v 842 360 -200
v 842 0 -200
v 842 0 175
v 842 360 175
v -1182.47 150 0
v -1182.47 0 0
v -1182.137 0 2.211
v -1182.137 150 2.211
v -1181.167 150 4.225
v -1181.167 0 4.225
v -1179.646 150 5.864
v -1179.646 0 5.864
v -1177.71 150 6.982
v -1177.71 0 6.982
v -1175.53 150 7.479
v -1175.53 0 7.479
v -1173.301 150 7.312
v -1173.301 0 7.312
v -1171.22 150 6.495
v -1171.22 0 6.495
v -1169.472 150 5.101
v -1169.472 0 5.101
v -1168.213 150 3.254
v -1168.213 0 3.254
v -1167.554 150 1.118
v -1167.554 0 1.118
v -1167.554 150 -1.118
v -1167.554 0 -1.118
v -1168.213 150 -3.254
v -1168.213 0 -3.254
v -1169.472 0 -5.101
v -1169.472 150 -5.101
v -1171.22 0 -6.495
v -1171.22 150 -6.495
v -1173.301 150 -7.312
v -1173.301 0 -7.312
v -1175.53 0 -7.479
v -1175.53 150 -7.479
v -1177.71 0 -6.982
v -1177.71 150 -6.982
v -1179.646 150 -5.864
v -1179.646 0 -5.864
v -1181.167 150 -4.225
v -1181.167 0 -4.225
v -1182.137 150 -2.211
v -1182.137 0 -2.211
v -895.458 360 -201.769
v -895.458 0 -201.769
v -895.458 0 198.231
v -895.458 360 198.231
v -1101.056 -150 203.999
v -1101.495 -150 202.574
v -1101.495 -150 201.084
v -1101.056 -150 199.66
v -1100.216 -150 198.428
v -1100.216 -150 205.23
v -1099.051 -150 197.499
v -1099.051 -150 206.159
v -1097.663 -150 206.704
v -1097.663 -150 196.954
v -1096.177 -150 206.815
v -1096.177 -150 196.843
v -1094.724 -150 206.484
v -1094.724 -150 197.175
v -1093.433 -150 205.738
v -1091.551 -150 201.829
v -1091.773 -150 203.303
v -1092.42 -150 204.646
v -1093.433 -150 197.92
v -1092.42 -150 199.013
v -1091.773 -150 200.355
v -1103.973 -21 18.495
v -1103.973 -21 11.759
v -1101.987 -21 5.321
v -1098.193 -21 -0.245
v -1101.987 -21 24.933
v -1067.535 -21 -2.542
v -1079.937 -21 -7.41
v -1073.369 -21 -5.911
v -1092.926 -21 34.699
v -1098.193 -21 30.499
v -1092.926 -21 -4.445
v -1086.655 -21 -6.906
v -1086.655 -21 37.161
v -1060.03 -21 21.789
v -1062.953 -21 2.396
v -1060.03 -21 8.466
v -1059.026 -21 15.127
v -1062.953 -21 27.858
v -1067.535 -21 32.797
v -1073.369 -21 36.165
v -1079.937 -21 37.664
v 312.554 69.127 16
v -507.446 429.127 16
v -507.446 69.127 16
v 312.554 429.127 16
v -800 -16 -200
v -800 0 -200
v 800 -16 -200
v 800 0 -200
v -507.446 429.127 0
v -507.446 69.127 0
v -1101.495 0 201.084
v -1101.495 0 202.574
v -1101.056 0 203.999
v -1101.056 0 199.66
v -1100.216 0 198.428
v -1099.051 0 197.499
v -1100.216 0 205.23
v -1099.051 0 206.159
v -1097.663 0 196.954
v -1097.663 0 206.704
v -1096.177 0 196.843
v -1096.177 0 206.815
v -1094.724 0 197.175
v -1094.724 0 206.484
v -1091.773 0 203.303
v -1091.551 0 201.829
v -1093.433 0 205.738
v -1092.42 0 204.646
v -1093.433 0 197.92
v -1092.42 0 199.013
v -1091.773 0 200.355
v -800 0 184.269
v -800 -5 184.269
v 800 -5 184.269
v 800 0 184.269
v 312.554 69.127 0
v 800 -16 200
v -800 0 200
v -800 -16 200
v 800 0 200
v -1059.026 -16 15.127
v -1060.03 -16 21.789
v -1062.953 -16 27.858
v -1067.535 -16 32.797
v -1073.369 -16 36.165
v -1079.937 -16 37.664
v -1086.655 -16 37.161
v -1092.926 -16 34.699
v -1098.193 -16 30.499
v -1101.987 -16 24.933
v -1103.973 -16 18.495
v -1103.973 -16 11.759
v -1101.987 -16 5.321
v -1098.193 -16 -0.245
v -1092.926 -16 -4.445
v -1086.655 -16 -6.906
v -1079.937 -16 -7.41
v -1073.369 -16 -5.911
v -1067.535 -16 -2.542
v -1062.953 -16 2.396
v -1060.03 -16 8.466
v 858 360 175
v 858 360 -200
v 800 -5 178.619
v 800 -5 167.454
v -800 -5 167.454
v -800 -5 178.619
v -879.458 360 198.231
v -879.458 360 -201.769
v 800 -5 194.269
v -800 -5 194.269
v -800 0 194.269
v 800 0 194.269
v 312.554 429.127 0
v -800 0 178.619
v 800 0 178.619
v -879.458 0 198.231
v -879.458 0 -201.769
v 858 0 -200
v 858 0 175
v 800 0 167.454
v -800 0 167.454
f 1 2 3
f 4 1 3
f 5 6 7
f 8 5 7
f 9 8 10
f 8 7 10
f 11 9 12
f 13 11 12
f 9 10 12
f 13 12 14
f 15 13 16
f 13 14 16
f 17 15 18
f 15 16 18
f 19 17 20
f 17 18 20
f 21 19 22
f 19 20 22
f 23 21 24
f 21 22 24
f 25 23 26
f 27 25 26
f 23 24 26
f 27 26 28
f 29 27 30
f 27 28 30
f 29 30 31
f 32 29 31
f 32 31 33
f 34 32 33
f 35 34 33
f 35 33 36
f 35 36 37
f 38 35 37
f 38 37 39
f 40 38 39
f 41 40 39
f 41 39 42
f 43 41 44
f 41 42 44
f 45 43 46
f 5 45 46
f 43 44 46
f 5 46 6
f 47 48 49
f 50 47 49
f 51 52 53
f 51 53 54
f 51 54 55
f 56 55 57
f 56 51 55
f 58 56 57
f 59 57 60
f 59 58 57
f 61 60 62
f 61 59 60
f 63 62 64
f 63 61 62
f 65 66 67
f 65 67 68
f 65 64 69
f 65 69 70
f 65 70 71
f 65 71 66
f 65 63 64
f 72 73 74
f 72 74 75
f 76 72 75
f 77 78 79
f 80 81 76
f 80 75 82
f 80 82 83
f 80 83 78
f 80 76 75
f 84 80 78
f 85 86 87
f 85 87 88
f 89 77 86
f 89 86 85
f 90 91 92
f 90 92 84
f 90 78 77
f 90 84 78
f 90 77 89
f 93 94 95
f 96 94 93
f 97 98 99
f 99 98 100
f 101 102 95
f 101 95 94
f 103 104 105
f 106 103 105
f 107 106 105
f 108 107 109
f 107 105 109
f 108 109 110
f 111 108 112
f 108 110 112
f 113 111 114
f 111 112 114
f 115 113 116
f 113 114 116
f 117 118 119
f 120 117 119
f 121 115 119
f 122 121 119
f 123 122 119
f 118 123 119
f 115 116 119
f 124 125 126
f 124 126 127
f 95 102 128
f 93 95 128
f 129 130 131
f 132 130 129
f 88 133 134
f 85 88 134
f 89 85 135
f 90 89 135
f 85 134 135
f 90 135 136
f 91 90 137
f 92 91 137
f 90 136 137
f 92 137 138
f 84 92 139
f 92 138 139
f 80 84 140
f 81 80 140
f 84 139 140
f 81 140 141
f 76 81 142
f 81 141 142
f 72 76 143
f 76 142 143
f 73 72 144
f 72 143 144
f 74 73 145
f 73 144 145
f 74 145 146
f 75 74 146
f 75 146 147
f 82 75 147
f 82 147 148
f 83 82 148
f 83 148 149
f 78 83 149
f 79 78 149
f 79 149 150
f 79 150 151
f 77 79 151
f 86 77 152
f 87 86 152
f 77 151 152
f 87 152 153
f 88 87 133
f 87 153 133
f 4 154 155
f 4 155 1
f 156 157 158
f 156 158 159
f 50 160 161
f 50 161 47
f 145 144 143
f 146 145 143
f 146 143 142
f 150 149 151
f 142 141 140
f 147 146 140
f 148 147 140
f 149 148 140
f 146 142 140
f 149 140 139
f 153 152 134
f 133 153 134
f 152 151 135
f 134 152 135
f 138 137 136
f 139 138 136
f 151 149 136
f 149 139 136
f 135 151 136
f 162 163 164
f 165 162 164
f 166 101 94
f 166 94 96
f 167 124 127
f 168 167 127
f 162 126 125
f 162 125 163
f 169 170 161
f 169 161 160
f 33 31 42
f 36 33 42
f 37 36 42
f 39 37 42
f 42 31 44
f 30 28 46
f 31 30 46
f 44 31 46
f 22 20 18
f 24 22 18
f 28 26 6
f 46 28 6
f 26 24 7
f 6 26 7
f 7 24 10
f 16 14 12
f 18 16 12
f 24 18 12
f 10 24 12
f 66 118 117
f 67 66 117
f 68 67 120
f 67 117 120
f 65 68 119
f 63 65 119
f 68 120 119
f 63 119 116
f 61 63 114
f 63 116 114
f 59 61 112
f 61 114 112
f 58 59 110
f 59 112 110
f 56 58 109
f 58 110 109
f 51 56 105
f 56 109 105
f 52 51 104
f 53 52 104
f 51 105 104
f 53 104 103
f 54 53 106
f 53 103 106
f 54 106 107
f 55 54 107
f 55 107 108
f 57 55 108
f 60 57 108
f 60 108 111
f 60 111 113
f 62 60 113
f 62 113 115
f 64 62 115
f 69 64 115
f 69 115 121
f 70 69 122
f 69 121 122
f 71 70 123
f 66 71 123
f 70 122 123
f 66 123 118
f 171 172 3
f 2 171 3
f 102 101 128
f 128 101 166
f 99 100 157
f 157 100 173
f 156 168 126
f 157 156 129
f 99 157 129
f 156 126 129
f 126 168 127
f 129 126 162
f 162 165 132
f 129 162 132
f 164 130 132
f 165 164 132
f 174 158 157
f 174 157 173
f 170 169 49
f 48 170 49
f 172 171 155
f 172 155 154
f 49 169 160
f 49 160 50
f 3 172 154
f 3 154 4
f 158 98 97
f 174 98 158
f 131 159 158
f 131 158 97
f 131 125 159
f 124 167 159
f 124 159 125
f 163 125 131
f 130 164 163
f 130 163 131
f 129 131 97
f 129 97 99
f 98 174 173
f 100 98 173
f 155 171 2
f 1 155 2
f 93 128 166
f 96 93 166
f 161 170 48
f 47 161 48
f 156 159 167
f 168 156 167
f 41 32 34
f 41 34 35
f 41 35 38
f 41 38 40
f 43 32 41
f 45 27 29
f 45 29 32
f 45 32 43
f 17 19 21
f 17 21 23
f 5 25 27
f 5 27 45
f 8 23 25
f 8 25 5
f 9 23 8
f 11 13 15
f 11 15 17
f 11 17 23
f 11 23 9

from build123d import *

# Parameters (mm, degrees)
F0_W      = 1600
F0_H      = 400
F1_DEPTH  = 16
F2_W      = 16
F2_H      = 400
F3_DEPTH  = 360
F4_R      = 7.5
F5_DEPTH  = 150
F6_R      = 22.6000160451
F7_DEPTH  = 5
F8_R      = 5
F9_DEPTH  = 150
F11_DEPTH = 25
F12_W     = 5
F12_H     = 10
F12_H_2   = 11.1646950245
F13_DEPTH = 1982.470792366
F14_W     = 820
F14_H     = 360
F15_DEPTH = 16


with BuildPart() as f1:
    # F0 (on Front) → F1 (new body)
    with BuildSketch(Plane.XZ):
        Rectangle(F0_W, F0_H)
    extrude(amount=F1_DEPTH)

    # F12 (on face) → F13 (cut, through all)
    with BuildSketch(Plane.YZ.offset(800)):
        with Locations((-2.5, 189.2690259218)):
            Rectangle(F12_W, F12_H)
        with Locations((-2.5, 173.0364263058)):
            Rectangle(F12_W, F12_H_2)
    extrude(amount=-F13_DEPTH, mode=Mode.SUBTRACT)


with BuildPart() as f3:
    # F2 (on face) → F3 (new body)
    with BuildSketch(Plane(origin=(0, 0, 0), x_dir=(-1, 0, 0), z_dir=(0, 1, 0))):
        with Locations((887.4577121735, -1.7694413662)):
            Rectangle(F2_W, F2_H)
    extrude(amount=F3_DEPTH)


with BuildPart() as f3b:
    # F2 (on face) → F3, piece 2 (new body)
    with BuildSketch(Plane(origin=(0, 0, 0), x_dir=(-1, 0, 0), z_dir=(0, 1, 0))):
        Rectangle(F2_W, F2_H)
    extrude(amount=F3_DEPTH)


with BuildPart() as f5:
    # F4 (on face) → F5 (new body)
    with BuildSketch(Plane(origin=(0, 0, 0), x_dir=(-1, 0, 0), z_dir=(0, 1, 0))):
        with Locations((1174.969792366, 0)):
            Circle(F4_R)
    extrude(amount=F5_DEPTH)


with BuildPart() as f7:
    # F6 (on face) → F7 (new body)
    with BuildSketch(Plane.XZ.offset(16)):
        with Locations((-1081.6255807877, 15.1271261275)):
            Circle(F6_R)
    extrude(amount=F7_DEPTH)


with BuildPart() as f9:
    # F8 (on Front) → F9 (new body)
    with BuildSketch(Plane.XZ):
        with Locations((-1096.5507030487, 201.8291354179)):
            Circle(F8_R)
    extrude(amount=F9_DEPTH)


with BuildPart() as f3b_1:
    # F10: moved
    add(f3b.part.moved(Location((850, 0, 0))))

    # F11 (cut): a face of the model
    f11_faces = [f3b_1.faces().sort_by_distance(p)[0] for p in [
        (850, 180, 200),
    ]]
    extrude(f11_faces, amount=-F11_DEPTH, mode=Mode.SUBTRACT)


with BuildPart() as f15:
    # F14 (on Top) → F15 (new body)
    with BuildSketch(Plane.XY):
        with Locations((-97.4464452267, 249.1268518567)):
            Rectangle(F14_W, F14_H)
    extrude(amount=F15_DEPTH)


solid = Compound([f1.part, f3.part, f5.part, f7.part, f9.part, f3b_1.part, f15.part])
